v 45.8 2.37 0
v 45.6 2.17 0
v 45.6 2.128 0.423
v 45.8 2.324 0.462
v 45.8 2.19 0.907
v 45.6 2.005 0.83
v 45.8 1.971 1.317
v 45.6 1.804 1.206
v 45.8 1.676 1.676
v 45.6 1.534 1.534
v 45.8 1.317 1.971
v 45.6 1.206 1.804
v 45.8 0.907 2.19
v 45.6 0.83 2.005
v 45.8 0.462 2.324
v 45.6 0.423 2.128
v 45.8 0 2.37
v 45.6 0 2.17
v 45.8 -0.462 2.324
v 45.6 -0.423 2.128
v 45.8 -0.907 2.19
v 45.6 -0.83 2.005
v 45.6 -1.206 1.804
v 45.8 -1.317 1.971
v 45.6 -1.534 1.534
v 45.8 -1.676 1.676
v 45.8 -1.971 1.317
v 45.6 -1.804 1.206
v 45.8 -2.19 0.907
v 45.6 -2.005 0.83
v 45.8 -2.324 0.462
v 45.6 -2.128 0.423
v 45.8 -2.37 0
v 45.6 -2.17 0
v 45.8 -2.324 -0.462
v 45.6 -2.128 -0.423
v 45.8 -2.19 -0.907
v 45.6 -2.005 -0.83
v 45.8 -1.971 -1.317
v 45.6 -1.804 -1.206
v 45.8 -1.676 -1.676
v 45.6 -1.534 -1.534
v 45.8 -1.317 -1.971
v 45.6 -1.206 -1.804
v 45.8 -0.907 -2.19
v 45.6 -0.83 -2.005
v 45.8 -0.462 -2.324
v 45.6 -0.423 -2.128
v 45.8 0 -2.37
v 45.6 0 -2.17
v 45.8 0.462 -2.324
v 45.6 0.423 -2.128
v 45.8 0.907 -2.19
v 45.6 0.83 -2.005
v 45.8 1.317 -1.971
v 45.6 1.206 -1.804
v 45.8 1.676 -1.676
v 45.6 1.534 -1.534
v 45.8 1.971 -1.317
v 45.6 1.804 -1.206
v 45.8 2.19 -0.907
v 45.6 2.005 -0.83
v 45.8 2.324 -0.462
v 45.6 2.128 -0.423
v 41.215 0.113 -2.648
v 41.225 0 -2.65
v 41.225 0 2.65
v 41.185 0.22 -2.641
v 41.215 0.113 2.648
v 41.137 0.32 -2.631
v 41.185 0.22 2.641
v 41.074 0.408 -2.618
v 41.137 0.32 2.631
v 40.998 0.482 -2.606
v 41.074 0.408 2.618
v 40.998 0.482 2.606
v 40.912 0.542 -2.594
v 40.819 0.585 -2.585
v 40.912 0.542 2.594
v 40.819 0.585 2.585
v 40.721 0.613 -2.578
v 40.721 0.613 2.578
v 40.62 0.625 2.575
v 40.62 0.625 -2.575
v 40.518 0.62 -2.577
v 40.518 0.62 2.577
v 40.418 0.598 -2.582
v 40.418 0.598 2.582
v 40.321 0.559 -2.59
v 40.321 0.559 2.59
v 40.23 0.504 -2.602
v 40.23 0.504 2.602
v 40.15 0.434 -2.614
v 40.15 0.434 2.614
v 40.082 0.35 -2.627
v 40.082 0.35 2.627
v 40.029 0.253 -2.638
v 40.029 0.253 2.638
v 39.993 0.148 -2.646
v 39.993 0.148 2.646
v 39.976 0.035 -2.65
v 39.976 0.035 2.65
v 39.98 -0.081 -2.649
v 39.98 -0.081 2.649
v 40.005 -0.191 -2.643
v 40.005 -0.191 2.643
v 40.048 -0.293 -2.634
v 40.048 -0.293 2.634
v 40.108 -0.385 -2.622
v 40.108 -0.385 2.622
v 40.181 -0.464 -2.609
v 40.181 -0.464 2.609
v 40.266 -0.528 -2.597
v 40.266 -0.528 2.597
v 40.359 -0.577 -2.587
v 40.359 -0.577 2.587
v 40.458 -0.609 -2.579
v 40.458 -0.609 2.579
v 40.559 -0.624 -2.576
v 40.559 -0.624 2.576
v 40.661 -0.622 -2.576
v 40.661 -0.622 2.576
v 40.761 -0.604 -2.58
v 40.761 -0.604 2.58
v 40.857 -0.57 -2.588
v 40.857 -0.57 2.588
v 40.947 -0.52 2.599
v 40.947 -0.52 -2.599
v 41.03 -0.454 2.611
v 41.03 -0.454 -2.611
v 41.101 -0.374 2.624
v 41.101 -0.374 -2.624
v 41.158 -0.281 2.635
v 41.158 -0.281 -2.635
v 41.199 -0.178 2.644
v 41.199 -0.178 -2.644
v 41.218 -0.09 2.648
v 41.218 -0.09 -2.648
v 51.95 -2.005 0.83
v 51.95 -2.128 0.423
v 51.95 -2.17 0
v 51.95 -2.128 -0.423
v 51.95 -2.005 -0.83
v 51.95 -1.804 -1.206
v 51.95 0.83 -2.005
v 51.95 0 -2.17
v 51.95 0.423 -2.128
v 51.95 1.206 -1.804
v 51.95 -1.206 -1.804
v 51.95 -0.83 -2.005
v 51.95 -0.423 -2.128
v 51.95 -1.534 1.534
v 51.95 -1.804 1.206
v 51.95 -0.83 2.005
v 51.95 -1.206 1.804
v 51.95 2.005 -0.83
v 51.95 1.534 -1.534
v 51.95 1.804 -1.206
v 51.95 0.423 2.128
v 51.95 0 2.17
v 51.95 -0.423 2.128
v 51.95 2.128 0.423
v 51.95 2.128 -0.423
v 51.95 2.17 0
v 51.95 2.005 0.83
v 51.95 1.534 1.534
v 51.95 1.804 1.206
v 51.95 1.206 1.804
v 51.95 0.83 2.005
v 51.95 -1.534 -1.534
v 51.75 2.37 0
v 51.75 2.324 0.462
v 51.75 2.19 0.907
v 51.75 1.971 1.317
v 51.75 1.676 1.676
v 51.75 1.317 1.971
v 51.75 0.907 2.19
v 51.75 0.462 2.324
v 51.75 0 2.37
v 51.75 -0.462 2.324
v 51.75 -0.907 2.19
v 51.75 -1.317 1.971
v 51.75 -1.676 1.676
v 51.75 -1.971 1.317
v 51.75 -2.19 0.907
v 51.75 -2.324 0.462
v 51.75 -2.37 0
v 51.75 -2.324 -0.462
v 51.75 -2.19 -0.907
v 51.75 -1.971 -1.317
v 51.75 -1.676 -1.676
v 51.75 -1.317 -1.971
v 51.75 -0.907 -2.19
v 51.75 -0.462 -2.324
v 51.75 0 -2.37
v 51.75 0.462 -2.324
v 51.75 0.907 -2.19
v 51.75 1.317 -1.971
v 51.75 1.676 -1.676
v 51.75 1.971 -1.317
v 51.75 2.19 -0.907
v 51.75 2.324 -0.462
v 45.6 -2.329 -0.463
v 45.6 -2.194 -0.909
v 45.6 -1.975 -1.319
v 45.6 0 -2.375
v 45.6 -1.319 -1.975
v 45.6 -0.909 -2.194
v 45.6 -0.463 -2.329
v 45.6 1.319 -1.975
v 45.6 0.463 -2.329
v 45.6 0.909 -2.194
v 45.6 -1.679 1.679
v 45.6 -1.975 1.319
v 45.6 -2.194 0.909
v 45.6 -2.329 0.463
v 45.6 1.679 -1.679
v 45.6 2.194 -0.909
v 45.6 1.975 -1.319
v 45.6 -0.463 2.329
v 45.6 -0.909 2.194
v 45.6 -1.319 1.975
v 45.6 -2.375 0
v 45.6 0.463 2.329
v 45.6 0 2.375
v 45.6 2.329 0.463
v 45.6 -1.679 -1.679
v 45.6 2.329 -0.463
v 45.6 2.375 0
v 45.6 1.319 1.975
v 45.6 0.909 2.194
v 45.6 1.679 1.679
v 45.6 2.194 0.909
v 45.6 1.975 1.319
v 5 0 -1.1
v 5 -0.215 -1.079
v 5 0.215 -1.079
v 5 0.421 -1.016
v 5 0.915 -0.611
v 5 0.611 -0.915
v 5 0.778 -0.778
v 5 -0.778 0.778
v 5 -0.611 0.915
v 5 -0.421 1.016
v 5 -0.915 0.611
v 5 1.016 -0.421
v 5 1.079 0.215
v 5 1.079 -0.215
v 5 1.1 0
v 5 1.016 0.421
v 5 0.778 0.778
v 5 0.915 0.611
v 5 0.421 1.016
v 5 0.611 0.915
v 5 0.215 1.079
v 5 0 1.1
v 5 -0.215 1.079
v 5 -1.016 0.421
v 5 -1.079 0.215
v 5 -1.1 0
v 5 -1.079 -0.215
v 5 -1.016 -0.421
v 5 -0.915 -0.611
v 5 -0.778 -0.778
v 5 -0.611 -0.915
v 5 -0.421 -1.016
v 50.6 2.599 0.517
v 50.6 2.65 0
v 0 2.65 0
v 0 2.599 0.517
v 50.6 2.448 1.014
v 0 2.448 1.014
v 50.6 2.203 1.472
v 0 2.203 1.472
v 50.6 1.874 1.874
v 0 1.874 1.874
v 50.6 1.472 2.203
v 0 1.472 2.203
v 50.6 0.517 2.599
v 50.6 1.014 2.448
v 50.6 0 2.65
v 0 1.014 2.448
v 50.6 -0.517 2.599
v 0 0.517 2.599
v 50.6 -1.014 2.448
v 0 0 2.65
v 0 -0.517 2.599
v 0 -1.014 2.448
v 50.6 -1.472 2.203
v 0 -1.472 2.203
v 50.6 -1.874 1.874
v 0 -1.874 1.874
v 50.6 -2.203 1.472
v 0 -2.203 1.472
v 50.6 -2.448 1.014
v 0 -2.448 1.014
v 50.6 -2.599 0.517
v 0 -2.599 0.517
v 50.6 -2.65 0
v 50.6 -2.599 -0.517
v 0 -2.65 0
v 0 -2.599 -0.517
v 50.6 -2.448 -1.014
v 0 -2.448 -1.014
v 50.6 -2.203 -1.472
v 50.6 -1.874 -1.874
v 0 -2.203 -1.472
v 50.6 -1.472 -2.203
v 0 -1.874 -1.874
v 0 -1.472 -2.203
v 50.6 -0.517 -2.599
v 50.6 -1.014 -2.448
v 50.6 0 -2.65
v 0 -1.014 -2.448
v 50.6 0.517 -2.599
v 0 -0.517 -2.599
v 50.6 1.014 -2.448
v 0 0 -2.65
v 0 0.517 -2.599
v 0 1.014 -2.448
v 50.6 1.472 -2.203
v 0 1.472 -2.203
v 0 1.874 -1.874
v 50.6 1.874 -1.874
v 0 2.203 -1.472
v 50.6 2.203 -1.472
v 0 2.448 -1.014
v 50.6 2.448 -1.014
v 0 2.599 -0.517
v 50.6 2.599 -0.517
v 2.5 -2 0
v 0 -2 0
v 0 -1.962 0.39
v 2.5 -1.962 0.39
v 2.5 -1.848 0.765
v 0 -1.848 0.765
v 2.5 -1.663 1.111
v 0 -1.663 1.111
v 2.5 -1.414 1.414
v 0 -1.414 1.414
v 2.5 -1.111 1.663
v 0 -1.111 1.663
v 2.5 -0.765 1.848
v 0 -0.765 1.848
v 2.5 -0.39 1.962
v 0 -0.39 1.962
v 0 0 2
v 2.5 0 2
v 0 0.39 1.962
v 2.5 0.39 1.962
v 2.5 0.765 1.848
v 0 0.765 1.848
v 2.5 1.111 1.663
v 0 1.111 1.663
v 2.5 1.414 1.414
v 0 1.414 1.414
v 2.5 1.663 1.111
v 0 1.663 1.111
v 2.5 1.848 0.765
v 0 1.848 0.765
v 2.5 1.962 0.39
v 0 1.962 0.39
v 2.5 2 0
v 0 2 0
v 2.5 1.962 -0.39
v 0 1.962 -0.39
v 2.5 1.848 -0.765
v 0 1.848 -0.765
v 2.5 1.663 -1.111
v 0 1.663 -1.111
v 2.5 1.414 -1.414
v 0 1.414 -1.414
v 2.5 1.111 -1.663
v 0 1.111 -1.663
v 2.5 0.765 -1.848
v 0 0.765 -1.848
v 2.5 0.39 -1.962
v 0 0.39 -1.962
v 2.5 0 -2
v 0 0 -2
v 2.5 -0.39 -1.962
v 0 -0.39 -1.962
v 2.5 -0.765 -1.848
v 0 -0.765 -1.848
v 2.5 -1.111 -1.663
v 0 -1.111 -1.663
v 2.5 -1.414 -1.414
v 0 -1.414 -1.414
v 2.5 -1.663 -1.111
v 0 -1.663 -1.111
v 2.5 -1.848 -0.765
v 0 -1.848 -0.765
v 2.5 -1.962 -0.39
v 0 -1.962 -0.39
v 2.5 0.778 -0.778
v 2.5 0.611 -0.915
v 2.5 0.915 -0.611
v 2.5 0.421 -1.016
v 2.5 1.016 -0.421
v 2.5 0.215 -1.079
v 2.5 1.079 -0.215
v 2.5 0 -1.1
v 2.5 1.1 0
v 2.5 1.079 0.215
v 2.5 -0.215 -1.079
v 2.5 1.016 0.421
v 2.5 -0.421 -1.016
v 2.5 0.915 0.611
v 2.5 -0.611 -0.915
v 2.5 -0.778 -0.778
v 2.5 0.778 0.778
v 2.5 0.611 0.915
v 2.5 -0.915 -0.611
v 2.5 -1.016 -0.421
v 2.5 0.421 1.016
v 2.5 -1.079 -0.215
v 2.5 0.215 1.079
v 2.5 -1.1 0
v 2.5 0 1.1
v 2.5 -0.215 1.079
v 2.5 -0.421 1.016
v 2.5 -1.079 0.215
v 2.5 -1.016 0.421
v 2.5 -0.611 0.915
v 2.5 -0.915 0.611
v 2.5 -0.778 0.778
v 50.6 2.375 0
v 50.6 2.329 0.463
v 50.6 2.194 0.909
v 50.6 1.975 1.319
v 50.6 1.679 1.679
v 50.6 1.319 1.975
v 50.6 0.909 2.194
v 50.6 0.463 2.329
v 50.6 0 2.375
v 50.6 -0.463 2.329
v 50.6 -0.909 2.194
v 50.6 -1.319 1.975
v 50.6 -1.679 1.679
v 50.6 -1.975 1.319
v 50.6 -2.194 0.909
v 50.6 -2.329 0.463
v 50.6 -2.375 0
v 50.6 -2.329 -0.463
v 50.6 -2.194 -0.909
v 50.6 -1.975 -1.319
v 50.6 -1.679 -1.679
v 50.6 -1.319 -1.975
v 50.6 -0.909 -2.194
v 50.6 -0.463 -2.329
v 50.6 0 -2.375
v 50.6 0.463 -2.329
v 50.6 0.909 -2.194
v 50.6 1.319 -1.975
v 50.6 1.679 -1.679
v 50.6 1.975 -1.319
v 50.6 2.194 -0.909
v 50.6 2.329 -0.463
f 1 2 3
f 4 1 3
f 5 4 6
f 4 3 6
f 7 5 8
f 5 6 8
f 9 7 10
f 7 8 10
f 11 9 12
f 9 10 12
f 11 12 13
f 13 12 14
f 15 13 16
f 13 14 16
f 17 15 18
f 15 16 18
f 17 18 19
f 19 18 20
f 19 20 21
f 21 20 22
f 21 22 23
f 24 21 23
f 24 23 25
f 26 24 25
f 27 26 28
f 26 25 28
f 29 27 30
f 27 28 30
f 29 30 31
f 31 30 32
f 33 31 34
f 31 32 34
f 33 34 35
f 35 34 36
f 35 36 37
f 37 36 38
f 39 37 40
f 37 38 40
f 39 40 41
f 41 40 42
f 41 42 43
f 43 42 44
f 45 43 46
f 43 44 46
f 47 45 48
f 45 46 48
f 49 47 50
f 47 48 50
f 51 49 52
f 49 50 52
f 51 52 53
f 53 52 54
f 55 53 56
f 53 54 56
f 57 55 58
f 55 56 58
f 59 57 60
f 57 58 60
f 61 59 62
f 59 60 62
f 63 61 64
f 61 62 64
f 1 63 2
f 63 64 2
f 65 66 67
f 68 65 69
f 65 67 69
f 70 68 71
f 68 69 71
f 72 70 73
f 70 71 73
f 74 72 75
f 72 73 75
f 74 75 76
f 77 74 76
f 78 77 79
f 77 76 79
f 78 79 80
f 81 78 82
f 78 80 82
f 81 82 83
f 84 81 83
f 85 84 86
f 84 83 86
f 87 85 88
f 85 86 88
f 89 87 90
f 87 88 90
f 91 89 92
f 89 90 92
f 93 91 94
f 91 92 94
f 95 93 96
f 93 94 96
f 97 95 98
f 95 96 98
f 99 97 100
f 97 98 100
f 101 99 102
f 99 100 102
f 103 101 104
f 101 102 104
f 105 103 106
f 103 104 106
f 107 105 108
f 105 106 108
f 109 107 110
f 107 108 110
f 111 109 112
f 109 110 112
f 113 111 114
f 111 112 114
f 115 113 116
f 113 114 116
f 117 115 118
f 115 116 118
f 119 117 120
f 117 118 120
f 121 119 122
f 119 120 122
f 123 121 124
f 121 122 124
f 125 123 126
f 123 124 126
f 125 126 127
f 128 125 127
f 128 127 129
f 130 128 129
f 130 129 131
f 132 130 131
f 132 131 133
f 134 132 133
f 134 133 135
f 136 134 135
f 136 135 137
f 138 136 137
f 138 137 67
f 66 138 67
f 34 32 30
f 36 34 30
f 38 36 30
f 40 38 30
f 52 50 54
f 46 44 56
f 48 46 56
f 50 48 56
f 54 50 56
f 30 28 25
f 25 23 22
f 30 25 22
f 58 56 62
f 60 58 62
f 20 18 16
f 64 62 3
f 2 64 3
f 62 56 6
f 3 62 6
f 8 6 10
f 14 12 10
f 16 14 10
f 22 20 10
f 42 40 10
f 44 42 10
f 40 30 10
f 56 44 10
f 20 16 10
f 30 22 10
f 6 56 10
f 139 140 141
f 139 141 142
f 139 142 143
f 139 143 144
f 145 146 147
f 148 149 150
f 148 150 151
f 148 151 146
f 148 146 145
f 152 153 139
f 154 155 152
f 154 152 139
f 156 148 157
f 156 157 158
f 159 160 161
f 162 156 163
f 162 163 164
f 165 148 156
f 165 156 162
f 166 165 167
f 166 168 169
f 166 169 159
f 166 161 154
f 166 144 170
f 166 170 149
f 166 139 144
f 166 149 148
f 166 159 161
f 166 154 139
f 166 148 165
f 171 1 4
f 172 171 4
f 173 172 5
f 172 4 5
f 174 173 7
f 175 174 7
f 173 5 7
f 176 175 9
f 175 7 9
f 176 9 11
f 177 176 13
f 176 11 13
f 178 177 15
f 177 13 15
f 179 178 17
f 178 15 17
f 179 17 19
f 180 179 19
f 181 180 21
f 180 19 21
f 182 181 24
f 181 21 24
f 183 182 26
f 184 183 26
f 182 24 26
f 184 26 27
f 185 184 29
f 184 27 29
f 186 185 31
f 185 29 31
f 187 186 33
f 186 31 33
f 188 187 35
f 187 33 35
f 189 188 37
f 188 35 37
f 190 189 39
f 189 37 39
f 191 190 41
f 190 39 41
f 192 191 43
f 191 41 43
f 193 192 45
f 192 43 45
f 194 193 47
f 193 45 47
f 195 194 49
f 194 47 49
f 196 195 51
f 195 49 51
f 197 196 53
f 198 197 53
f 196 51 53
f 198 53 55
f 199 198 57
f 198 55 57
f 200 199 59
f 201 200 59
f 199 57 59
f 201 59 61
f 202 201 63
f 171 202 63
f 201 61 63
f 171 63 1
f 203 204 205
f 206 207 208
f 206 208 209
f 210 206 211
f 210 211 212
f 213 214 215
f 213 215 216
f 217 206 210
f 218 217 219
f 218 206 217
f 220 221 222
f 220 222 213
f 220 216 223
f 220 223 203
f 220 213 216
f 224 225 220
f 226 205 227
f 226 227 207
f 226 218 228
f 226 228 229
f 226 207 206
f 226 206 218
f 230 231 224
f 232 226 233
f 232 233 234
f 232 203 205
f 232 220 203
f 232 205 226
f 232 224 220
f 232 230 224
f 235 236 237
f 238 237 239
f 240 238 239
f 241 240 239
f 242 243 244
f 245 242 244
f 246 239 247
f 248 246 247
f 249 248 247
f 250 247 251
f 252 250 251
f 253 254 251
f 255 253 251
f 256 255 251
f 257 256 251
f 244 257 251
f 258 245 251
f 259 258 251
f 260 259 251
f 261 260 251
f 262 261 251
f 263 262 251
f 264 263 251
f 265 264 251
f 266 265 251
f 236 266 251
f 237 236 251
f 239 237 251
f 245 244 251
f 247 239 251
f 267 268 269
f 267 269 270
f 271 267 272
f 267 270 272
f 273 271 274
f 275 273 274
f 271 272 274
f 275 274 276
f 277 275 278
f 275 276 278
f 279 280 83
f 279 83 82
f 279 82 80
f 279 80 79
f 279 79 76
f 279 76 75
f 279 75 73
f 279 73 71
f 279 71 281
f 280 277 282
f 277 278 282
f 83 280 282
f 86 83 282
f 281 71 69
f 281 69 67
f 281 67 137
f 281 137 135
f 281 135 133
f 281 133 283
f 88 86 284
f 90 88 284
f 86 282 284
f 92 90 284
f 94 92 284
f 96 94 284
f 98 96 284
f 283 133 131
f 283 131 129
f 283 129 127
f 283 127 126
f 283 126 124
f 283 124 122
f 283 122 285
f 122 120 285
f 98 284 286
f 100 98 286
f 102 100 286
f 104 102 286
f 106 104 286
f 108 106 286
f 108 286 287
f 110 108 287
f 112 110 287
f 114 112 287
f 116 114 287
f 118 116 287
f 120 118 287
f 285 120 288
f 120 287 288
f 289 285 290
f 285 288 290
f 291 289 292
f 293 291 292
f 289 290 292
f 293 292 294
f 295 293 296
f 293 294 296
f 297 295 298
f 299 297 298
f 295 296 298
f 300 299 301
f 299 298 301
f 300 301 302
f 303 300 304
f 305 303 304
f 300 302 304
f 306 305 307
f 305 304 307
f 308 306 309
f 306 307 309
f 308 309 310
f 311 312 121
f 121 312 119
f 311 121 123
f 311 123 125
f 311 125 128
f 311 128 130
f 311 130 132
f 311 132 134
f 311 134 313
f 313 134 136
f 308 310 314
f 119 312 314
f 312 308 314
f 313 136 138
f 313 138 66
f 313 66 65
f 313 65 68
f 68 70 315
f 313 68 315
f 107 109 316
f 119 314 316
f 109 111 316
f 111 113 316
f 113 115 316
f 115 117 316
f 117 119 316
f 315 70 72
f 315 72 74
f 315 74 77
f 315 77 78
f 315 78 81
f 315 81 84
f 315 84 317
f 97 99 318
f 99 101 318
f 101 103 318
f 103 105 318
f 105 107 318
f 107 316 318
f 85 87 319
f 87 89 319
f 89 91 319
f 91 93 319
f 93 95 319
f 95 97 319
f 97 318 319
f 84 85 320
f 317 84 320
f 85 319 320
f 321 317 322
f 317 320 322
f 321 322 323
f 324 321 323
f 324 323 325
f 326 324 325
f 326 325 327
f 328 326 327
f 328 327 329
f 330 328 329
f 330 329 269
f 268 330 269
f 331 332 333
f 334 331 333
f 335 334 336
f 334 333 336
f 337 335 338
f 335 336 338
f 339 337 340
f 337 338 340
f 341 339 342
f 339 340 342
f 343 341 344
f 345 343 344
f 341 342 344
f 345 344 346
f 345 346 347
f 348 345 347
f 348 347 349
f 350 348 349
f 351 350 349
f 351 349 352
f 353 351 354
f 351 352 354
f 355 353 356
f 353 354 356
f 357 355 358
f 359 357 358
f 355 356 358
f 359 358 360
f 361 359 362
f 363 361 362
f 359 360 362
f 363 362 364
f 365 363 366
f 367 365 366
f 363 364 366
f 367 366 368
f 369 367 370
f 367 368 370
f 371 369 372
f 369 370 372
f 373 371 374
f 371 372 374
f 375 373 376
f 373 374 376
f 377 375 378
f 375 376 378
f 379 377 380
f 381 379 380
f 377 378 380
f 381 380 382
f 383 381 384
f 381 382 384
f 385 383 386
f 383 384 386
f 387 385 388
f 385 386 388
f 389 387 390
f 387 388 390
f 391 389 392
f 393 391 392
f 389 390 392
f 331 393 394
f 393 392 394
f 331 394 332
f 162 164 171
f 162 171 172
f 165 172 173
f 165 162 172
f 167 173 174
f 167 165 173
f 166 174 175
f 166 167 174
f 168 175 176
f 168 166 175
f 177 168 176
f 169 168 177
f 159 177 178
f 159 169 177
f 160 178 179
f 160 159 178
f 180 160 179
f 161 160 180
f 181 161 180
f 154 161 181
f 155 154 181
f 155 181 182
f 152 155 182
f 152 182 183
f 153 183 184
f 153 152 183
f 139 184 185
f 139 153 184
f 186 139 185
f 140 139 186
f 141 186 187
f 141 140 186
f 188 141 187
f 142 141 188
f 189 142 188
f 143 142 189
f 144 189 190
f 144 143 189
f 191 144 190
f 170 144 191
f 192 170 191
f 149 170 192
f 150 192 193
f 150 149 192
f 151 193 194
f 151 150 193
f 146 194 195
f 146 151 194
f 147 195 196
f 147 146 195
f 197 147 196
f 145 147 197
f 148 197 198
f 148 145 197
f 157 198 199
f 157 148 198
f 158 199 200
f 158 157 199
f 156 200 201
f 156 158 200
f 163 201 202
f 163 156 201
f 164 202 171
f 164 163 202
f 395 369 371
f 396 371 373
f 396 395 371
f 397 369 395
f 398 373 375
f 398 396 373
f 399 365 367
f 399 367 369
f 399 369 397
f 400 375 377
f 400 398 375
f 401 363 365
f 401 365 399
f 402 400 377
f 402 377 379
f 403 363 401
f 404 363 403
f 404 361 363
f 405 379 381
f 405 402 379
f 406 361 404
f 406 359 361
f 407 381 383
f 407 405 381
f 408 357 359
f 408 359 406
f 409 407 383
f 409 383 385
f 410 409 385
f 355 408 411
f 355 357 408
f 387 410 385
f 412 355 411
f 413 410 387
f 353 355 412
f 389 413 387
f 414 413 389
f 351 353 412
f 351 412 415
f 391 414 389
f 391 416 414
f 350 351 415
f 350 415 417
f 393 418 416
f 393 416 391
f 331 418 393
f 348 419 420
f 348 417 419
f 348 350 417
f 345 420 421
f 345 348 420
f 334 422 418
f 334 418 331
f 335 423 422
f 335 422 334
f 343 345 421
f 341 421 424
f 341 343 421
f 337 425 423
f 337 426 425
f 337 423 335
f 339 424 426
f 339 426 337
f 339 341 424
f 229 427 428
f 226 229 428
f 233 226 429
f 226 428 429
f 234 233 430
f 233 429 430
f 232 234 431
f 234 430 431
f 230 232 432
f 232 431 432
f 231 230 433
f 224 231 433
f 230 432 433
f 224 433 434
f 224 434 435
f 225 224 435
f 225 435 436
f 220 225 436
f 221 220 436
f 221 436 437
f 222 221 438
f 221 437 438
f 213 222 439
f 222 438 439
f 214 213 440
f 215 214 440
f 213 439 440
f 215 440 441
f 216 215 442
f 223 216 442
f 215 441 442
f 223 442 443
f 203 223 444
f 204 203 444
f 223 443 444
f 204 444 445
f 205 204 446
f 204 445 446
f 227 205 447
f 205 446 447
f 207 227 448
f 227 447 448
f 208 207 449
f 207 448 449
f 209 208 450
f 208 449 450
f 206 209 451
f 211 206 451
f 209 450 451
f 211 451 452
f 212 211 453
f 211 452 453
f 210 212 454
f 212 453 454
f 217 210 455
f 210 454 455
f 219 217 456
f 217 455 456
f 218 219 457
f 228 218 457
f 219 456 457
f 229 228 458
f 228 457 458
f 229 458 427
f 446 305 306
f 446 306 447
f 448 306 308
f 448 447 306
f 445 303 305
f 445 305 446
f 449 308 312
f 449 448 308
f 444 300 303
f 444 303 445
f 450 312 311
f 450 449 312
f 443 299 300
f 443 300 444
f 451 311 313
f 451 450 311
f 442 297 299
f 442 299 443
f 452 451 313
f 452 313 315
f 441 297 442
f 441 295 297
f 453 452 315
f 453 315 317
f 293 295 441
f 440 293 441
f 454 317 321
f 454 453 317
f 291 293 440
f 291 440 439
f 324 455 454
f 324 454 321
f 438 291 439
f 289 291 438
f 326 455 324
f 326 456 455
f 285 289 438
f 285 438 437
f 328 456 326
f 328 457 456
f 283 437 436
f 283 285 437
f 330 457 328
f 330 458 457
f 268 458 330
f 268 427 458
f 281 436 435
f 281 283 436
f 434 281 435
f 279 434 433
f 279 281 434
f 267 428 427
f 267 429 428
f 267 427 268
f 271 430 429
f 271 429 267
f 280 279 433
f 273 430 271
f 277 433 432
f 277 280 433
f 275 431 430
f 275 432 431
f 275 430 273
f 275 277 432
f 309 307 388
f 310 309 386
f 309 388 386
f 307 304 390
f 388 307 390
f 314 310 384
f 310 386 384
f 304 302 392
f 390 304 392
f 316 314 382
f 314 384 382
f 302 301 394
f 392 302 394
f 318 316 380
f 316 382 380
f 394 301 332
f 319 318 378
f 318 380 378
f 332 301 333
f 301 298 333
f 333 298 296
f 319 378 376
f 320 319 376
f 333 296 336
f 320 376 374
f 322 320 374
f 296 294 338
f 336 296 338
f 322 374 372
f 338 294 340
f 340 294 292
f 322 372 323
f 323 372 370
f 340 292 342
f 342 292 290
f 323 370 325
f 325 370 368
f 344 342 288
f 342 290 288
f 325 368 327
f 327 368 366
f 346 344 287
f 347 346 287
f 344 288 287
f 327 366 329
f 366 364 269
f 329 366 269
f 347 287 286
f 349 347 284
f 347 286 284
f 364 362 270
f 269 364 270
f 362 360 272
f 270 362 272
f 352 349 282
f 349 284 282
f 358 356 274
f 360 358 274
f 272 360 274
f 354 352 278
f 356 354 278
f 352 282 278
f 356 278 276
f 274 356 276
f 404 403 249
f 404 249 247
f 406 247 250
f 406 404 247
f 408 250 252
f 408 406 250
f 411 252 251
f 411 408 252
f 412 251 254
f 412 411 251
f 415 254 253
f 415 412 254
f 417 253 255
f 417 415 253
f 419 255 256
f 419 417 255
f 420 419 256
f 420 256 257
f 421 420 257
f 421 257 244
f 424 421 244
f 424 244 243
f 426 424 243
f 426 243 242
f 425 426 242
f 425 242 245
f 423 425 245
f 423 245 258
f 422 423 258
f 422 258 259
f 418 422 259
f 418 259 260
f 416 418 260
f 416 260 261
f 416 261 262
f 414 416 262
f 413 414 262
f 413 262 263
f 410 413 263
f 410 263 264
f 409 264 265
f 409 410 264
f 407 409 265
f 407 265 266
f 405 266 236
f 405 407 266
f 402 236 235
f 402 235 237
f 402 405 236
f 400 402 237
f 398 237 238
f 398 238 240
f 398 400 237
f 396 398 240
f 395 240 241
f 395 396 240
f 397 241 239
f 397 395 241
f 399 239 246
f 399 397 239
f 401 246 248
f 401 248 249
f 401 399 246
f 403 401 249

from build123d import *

# Parameters (mm, degrees)
F0_R      = 2.65
F1_DEPTH  = 50.6
F2_R      = 1.1
F3_DEPTH  = 5
F4_R      = 0.625
F5_DEPTH  = 12.5
F6_R      = 2
F7_DEPTH  = 2.5
F8_R      = 2.375
F9_DEPTH  = 5
F10_R     = 2.37
F11_DEPTH = 6.35
F12_SIZE  = 0.2


with BuildPart() as f1:
    # F0 (on Right) → F1 (new body)
    with BuildSketch(Plane.YZ):
        Circle(F0_R)
    extrude(amount=F1_DEPTH)

    # F2 (on Right) → F3 (cut)
    with BuildSketch(Plane.YZ):
        Circle(F2_R)
    extrude(amount=F3_DEPTH, mode=Mode.SUBTRACT)

    # F4 (on Top) → F5 (cut, symmetric)
    with BuildSketch(Plane.XY):
        with Locations((40.6, 0)):
            Circle(F4_R)
    extrude(amount=F5_DEPTH, both=True, mode=Mode.SUBTRACT)

    # F6 (on face) → F7 (cut)
    with BuildSketch(Plane(origin=(0, 0, 0), x_dir=(0, -1, 0), z_dir=(-1, 0, 0))):
        Circle(F6_R)
    extrude(amount=-F7_DEPTH, mode=Mode.SUBTRACT)

    # F8 (on face) → F9 (cut)
    with BuildSketch(Plane.YZ.offset(50.6)):
        Circle(F8_R)
    extrude(amount=-F9_DEPTH, mode=Mode.SUBTRACT)


with BuildPart() as f11:
    # F10 (on face) → F11 (new body)
    with BuildSketch(Plane.YZ.offset(45.6)):
        Circle(F10_R)
    extrude(amount=F11_DEPTH)

    # F12
    f12_edges = [f11.edges().sort_by_distance(p)[0] for p in [
        (51.95, -2.37, 0),
        (45.6, -2.37, 0),
    ]]
    chamfer(f12_edges, length=F12_SIZE)


solid = Compound([f1.part, f11.part])
